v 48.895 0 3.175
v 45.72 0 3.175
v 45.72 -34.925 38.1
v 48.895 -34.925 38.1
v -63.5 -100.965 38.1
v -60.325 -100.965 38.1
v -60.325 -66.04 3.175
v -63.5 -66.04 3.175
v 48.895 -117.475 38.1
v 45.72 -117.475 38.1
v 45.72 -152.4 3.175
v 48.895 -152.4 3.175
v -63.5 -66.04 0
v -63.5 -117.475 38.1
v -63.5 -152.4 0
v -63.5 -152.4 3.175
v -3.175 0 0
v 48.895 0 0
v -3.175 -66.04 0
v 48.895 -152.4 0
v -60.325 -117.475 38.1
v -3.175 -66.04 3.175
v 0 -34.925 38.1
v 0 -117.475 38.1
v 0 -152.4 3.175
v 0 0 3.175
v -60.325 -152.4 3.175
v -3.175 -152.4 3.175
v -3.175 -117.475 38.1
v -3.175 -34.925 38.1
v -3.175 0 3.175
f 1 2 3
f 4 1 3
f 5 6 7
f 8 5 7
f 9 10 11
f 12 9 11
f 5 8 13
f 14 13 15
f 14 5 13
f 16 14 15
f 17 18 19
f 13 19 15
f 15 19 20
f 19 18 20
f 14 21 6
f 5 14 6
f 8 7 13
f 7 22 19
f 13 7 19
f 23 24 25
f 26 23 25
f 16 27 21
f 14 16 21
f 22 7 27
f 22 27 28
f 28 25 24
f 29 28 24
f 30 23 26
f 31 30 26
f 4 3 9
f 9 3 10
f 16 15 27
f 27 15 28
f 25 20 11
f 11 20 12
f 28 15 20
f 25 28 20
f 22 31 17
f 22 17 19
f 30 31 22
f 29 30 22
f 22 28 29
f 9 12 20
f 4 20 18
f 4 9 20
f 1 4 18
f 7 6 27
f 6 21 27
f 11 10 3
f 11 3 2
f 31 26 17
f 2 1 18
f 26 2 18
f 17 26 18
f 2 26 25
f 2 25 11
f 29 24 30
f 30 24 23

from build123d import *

# Parameters (mm, degrees)
F0_W     = 45.72
F0_H     = 152.4
F1_DEPTH = 3.175
F3_DEPTH = 3.175
F5_DEPTH = 3.175
F6_W     = 57.15
F6_H     = 86.36
F7_DEPTH = 3.175
F9_DEPTH = 3.175


with BuildPart() as f1:
    # F0 (on Top) → F1 (new body)
    with BuildSketch(Plane.XY):
        with Locations((22.86, -76.2)):
            Rectangle(F0_W, F0_H)
    extrude(amount=F1_DEPTH)

    # F2 (on face) → F3 (join)
    with BuildSketch(Plane.YZ.offset(45.72)):
        Polygon((-152.4, 3.175), (-152.4, 0), (0, 0), (0, 3.175), (-34.925, 38.1), (-117.475, 38.1), align=None)
    extrude(amount=F3_DEPTH)

    # F4 (on face) → F5 (join)
    with BuildSketch(Plane(origin=(0, 0, 0), x_dir=(0, -1, 0), z_dir=(-1, 0, 0))):
        Polygon((34.925, 38.1), (0, 3.175), (152.4, 3.175), (117.475, 38.1), align=None)
        Polygon((0, 3.175), (0, 0), (152.4, 0), (152.4, 3.175), (117.475, 38.1), (34.925, 38.1), align=None)
    extrude(amount=F5_DEPTH)

    # F6 (on face) → F7 (join)
    with BuildSketch(Plane(origin=(0, 0, 0), x_dir=(1, 0, 0), z_dir=(0, 0, -1))):
        with Locations((-31.75, 109.22)):
            Rectangle(F6_W, F6_H)
    extrude(amount=-F7_DEPTH)

    # F8 (on face) → F9 (join)
    with BuildSketch(Plane(origin=(-60.325, 0, 0), x_dir=(0, -1, 0), z_dir=(-1, 0, 0))):
        Polygon((66.04, 0), (152.4, 0), (152.4, 3.175), (117.475, 38.1), (100.965, 38.1), (66.04, 3.175), align=None)
    extrude(amount=F9_DEPTH)


solid = f1.part
